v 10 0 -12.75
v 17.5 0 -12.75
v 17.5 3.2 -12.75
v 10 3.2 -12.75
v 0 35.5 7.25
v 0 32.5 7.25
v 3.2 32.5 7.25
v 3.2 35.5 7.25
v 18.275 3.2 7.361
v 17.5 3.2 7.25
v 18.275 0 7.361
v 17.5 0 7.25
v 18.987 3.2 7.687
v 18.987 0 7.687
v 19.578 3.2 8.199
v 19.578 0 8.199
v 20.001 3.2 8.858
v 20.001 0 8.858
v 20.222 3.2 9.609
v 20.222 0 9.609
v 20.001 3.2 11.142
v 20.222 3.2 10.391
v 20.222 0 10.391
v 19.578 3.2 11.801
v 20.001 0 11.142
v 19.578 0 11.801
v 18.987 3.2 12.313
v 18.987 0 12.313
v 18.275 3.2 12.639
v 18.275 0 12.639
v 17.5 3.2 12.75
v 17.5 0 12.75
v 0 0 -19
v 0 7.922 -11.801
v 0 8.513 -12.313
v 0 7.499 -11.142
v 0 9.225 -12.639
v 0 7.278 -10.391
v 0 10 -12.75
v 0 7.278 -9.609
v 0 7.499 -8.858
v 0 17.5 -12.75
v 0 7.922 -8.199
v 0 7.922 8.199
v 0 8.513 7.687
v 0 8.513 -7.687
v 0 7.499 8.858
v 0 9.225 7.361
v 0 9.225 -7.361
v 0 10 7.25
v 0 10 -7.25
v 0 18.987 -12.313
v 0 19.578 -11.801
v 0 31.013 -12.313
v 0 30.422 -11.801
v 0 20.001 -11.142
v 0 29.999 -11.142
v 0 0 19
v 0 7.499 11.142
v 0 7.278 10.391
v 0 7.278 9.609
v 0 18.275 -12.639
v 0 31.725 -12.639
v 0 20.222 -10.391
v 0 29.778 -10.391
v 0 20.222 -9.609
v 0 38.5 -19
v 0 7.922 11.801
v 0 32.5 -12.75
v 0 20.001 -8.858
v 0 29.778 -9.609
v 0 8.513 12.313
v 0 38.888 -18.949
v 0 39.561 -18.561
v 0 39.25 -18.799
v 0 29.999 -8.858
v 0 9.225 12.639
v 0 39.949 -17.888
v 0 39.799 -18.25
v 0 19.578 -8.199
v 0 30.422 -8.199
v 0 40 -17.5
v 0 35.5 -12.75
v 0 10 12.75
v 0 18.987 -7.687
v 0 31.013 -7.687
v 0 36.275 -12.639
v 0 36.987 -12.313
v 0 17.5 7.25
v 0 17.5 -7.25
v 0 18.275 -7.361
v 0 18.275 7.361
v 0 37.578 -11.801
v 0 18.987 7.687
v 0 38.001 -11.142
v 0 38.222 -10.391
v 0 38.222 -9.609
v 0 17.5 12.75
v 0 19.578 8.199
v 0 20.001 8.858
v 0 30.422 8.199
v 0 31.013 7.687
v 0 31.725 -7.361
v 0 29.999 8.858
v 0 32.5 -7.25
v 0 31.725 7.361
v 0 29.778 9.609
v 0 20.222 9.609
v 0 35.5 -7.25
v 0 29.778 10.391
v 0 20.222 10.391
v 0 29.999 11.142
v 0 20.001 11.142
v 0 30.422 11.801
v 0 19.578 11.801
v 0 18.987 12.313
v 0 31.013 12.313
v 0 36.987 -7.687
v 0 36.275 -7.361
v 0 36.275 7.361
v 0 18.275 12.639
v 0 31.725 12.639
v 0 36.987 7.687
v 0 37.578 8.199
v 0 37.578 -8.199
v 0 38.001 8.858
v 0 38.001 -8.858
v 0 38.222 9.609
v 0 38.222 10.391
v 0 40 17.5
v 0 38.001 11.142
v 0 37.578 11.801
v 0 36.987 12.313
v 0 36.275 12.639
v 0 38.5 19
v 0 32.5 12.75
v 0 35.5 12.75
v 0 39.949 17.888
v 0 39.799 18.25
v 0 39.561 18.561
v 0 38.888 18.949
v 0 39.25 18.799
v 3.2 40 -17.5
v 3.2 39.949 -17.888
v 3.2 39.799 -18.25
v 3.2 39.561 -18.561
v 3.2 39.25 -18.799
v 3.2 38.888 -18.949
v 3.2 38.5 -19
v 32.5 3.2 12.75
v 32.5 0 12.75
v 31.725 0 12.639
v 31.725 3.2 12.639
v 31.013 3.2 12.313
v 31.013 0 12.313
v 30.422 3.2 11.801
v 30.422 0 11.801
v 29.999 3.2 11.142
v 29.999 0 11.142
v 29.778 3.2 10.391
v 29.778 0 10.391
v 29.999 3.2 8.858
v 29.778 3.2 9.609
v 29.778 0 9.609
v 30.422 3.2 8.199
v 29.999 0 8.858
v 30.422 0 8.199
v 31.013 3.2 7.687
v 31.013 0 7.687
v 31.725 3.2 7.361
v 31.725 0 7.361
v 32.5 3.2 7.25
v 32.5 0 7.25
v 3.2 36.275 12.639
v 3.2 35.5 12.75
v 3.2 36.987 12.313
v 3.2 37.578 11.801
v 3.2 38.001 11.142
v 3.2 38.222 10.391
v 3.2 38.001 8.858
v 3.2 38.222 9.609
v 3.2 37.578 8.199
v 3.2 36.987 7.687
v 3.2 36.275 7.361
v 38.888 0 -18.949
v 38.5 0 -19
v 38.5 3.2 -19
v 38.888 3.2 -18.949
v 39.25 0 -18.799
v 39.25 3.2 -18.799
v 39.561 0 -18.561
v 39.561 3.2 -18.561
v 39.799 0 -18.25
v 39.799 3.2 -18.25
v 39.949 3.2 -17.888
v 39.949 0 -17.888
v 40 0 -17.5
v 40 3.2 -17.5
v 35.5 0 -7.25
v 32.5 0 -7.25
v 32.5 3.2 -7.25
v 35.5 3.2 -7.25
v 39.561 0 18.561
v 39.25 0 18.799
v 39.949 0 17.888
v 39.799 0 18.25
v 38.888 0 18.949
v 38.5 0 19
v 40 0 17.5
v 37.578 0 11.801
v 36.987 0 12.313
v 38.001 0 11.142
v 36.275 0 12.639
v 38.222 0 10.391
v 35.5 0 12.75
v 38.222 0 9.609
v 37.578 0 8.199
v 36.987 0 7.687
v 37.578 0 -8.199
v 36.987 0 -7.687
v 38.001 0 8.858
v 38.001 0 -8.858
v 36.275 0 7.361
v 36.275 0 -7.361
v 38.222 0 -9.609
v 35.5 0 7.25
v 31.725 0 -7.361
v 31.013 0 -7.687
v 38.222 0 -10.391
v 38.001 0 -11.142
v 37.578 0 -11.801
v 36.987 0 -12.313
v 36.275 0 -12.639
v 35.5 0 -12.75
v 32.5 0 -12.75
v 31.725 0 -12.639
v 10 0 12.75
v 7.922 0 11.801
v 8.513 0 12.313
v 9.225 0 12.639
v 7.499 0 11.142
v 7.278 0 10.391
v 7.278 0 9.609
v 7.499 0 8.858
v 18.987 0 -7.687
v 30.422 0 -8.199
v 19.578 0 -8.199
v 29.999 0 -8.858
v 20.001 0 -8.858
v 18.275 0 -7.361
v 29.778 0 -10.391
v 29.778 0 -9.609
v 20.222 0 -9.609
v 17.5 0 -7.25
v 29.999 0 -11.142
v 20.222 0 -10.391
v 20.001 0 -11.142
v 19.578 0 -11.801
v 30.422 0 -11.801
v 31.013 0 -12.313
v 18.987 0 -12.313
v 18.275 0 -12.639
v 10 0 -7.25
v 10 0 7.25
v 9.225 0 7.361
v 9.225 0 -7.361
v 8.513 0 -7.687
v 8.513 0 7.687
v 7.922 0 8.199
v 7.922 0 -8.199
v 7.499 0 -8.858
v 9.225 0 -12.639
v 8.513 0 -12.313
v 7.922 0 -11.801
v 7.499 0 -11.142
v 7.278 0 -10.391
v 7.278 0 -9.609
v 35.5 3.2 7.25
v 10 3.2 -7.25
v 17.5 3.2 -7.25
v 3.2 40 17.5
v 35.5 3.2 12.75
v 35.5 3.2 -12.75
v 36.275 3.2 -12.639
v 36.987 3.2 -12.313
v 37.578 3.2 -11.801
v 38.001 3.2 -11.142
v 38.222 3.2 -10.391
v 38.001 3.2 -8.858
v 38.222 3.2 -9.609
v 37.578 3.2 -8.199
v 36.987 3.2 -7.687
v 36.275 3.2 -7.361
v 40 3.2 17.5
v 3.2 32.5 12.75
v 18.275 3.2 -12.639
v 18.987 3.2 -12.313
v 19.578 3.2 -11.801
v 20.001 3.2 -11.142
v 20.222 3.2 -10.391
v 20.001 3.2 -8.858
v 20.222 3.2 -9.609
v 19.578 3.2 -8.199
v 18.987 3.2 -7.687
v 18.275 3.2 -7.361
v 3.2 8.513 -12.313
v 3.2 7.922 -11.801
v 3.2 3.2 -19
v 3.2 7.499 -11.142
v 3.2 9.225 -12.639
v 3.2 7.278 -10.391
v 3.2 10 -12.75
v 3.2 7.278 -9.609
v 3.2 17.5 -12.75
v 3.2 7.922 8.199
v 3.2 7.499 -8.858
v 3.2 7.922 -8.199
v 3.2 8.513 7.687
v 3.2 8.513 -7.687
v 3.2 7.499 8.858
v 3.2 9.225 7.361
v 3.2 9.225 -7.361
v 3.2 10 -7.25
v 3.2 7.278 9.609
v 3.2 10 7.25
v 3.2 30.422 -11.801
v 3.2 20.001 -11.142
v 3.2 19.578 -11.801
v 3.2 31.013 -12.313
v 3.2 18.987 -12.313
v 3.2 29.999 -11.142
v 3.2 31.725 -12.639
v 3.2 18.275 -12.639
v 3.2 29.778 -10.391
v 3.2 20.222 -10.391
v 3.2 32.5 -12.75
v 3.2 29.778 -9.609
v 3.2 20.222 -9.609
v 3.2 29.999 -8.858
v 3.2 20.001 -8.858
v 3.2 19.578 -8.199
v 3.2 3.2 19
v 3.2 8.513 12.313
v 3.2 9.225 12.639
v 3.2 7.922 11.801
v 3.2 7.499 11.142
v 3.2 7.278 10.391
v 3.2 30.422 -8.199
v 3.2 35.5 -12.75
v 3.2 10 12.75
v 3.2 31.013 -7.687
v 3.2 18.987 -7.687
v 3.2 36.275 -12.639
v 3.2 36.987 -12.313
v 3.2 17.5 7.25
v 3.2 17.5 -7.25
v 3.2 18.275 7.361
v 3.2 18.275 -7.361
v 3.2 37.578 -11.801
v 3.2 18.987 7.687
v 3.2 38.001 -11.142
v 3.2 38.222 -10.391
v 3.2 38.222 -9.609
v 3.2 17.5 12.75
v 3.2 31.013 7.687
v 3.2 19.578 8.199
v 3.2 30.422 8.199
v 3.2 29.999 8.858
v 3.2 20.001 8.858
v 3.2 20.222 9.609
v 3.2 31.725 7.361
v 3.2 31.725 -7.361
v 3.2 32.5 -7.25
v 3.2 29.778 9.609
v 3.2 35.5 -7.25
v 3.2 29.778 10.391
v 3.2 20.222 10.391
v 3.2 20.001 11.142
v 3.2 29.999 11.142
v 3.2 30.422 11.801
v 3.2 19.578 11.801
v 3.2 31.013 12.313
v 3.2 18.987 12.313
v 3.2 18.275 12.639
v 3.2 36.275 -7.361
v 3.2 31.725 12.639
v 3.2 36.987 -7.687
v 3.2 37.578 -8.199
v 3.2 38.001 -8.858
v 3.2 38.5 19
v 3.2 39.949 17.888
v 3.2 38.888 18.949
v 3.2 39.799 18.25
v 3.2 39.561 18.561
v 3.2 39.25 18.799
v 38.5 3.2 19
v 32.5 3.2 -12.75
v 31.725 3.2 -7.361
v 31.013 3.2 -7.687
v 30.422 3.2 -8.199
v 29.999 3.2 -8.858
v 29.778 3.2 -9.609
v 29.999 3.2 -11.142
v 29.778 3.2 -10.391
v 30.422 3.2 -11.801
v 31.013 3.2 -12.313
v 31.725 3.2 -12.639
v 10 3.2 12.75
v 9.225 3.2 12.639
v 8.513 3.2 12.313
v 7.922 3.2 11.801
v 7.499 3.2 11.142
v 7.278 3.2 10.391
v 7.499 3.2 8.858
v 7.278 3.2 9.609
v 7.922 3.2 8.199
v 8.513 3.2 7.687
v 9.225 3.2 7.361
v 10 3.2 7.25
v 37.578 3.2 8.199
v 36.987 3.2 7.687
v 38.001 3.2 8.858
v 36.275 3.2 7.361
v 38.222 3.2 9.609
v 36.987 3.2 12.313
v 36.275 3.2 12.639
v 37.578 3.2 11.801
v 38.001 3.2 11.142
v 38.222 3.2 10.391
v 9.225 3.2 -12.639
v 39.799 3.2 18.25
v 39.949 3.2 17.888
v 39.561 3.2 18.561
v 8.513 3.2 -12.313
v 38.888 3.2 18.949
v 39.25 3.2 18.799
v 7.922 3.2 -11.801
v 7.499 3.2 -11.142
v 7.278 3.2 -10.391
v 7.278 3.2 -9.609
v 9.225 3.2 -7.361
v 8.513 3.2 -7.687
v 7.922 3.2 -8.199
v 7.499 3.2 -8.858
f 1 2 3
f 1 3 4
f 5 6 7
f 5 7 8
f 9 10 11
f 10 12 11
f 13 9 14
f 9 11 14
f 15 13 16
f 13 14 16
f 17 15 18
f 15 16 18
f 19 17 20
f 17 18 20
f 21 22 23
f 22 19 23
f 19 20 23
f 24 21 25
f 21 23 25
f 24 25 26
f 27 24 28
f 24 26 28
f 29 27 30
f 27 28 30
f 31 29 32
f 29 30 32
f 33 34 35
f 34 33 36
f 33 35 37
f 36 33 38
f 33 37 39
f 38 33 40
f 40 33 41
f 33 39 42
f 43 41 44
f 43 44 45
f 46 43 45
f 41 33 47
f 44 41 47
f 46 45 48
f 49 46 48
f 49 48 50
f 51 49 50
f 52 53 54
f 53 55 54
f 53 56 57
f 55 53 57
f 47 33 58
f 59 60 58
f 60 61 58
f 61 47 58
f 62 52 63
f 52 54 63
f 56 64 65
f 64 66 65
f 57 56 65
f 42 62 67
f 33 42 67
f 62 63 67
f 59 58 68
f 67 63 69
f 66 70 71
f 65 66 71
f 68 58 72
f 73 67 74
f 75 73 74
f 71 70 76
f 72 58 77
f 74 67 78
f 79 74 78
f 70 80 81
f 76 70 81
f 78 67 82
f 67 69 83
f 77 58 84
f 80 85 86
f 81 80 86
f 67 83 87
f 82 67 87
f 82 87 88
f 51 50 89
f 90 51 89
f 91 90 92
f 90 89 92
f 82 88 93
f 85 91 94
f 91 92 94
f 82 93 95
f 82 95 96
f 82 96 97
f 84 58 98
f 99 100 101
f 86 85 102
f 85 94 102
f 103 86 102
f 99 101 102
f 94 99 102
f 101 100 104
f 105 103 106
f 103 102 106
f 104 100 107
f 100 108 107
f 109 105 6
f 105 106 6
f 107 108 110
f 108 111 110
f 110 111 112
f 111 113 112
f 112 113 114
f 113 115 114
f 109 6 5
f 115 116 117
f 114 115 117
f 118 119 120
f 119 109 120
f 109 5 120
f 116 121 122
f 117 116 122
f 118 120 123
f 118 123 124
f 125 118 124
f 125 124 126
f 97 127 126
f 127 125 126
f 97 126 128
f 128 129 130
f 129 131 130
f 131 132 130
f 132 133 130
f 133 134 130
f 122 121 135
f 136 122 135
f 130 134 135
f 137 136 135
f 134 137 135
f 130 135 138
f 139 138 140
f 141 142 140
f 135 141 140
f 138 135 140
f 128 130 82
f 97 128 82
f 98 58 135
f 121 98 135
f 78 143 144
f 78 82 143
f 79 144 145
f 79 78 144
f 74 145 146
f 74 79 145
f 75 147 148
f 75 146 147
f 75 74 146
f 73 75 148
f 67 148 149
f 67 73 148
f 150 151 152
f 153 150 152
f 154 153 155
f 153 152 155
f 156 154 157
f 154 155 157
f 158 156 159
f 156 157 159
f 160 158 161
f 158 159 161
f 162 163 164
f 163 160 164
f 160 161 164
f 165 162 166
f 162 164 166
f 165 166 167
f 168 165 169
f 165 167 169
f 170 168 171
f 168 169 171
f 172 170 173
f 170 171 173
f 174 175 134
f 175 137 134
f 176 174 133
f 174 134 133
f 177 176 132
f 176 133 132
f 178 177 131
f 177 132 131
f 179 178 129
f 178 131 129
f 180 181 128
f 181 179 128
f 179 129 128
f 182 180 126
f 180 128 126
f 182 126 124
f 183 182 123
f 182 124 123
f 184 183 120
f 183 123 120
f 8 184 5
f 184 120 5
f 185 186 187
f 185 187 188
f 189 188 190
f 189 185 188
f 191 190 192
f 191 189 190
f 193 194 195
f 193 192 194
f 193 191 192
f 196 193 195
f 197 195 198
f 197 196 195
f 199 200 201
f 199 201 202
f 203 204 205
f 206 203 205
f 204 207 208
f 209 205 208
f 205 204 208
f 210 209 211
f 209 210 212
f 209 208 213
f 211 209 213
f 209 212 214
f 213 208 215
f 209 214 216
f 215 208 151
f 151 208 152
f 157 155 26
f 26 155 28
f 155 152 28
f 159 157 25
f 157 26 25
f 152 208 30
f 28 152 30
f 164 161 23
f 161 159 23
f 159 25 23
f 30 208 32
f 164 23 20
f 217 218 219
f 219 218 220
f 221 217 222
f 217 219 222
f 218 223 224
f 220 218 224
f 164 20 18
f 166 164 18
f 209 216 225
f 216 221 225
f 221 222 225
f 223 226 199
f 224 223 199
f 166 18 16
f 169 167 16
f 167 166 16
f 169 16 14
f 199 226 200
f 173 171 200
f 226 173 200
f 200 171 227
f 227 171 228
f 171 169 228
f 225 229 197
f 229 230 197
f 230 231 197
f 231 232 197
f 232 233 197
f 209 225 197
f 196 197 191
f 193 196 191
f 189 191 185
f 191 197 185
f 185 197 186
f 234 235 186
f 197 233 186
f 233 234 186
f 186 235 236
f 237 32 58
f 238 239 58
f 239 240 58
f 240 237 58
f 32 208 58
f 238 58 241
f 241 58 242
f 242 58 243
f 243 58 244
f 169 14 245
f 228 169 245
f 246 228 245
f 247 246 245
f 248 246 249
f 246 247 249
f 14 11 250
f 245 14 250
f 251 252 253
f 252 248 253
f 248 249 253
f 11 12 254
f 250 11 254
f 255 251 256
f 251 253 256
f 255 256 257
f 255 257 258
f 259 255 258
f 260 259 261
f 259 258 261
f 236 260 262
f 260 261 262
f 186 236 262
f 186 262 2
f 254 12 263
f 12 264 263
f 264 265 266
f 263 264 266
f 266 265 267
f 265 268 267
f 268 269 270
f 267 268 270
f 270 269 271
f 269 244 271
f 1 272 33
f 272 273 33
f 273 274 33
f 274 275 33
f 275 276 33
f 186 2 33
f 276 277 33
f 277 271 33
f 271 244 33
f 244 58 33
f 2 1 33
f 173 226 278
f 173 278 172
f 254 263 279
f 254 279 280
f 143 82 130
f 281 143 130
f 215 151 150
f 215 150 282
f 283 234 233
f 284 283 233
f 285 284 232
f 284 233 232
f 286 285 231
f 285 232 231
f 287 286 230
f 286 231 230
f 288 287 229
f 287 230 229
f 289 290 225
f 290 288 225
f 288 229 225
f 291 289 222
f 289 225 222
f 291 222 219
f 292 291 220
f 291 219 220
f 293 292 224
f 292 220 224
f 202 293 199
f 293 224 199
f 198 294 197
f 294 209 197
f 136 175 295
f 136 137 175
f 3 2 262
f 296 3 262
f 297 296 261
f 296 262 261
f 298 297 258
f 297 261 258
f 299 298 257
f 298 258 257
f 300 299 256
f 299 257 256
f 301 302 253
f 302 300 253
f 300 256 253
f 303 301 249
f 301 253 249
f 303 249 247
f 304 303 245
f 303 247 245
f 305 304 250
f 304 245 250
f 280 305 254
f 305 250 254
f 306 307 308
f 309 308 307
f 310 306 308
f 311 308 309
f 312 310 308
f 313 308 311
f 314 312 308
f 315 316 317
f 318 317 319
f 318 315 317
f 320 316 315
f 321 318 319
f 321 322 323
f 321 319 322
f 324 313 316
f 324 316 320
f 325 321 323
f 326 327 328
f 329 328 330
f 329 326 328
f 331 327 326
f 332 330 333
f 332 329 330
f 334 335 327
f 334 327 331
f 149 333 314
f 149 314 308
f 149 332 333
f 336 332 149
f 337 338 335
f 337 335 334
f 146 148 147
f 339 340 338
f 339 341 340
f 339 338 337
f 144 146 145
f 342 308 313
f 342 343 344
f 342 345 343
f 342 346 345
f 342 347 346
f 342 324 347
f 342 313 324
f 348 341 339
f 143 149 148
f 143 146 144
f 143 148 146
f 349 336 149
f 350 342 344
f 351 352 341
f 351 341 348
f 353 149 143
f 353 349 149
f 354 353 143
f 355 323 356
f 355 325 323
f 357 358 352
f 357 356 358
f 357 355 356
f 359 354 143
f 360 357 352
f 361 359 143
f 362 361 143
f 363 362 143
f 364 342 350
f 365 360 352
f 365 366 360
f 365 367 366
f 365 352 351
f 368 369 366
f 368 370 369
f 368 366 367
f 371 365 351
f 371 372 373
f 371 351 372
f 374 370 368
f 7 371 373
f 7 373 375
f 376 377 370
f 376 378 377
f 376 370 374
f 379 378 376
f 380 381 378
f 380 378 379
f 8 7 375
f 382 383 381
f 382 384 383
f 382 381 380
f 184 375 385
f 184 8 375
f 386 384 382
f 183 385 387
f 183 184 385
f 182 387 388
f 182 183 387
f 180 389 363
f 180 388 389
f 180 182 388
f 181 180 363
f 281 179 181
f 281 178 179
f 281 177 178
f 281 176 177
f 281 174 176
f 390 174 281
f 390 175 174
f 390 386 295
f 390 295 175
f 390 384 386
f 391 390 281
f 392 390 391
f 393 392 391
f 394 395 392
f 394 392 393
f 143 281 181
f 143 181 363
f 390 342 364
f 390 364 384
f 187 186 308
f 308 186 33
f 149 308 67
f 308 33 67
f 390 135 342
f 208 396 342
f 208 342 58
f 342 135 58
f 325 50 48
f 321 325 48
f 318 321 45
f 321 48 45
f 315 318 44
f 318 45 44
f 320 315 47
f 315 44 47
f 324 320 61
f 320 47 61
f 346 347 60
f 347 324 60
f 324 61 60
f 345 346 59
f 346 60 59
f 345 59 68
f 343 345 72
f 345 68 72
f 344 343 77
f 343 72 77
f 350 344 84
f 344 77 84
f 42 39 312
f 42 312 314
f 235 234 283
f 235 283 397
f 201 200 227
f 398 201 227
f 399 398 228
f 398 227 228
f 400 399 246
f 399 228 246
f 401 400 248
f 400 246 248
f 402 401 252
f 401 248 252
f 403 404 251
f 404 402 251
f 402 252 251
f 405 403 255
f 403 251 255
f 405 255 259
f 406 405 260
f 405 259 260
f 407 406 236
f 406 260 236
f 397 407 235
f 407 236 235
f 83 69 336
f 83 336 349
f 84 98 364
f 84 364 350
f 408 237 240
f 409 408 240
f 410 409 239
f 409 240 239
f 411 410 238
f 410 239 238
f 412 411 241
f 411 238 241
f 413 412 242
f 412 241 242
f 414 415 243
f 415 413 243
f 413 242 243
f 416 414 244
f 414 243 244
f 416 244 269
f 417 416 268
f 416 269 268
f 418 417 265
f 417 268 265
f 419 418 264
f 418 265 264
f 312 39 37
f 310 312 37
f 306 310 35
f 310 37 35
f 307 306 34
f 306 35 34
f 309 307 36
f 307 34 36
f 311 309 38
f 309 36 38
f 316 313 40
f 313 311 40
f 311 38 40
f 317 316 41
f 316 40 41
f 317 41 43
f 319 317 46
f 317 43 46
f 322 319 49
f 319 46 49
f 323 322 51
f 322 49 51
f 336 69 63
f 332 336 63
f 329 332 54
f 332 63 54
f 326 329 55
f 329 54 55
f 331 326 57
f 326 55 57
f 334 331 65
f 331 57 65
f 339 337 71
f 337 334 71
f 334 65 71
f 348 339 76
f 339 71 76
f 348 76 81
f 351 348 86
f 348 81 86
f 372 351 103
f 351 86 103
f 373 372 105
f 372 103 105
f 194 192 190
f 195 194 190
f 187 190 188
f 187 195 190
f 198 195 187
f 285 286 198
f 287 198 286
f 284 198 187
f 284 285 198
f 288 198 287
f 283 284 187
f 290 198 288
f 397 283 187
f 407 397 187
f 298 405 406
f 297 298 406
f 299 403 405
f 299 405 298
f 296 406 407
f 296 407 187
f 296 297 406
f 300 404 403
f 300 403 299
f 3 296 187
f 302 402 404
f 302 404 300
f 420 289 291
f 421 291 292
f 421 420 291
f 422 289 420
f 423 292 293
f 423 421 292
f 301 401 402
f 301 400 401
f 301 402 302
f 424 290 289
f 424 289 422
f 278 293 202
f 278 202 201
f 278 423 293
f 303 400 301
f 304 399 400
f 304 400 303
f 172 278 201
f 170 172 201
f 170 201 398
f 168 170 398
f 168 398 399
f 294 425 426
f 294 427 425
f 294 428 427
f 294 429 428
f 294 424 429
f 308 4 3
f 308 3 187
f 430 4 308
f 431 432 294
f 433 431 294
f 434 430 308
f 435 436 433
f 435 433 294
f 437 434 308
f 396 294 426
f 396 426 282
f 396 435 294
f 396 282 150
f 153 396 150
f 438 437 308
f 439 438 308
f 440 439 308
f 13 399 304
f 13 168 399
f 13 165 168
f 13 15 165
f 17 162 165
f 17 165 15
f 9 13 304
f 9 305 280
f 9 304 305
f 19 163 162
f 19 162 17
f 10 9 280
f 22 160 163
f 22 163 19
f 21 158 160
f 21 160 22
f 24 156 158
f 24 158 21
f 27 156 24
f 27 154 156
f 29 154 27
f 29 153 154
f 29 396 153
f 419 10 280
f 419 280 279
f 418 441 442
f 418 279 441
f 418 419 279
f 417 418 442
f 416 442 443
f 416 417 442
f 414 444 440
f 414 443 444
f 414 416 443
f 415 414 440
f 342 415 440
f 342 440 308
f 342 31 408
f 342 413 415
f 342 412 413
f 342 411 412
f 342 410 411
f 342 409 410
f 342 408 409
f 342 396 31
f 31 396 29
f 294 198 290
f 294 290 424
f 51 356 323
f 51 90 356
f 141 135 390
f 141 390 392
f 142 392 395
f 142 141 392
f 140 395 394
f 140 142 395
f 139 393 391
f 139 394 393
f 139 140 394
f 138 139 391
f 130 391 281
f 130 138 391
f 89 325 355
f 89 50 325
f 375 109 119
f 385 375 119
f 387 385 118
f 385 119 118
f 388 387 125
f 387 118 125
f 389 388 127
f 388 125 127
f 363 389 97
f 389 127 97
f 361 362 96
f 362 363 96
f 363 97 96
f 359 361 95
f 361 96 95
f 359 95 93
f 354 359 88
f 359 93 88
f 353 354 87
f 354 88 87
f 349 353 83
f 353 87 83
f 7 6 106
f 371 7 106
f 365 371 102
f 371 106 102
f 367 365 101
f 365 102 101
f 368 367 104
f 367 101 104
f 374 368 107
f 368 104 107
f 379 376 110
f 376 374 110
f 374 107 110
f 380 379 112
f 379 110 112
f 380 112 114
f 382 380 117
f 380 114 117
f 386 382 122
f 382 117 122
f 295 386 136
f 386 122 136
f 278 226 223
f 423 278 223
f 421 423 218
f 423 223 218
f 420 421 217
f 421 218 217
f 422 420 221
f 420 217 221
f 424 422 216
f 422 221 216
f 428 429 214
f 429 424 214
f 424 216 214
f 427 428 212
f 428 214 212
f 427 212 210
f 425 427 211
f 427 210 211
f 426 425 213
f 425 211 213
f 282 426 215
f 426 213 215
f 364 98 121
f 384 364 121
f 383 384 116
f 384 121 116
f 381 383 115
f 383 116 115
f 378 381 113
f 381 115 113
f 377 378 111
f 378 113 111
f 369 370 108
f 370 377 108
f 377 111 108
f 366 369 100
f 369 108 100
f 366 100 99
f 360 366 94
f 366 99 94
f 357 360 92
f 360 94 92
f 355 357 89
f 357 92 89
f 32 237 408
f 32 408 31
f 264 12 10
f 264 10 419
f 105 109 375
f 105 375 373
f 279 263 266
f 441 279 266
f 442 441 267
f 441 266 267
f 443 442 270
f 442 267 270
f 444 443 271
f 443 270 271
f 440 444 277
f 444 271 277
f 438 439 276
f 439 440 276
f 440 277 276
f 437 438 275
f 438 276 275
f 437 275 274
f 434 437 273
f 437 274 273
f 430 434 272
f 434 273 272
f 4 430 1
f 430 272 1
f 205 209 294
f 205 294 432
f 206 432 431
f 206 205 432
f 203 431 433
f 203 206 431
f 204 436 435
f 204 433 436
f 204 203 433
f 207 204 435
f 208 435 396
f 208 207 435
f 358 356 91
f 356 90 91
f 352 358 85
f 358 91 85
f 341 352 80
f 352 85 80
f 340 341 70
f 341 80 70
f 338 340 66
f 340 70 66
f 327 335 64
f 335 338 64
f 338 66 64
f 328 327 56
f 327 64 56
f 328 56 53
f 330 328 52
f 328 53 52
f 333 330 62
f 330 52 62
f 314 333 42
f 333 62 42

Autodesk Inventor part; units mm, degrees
sketch "Sketch_1" plane through (0, 0, 0) normal (1, 0, 0) x (0, 1, 0)
  line L0 (38.5, 19) -> (0, 19)
  line L1 (0, 19) -> (0, -19)
  line L2 (0, -19) -> (38.5, -19)
  arc A0 (38.5, -19) -> (40, -17.5) centre (38.5, -17.5) ccw
  line L3 (40, -17.5) -> (40, 17.5)
  arc A1 (40, 17.5) -> (38.5, 19) centre (38.5, 17.5) ccw
  line L4 (17.5, -7.25) -> (10, -7.25)
  arc A2 (10, -7.25) -> (10, -12.75) centre (10, -10) ccw
  line L5 (10, -12.75) -> (17.5, -12.75)
  arc A3 (17.5, -12.75) -> (17.5, -7.25) centre (17.5, -10) ccw
  line L6 (35.5, -7.25) -> (32.5, -7.25)
  arc A4 (32.5, -7.25) -> (32.5, -12.75) centre (32.5, -10) ccw
  line L7 (32.5, -12.75) -> (35.5, -12.75)
  arc A5 (35.5, -12.75) -> (35.5, -7.25) centre (35.5, -10) ccw
  line L8 (17.5, 12.75) -> (10, 12.75)
  arc A6 (10, 12.75) -> (10, 7.25) centre (10, 10) ccw
  line L9 (10, 7.25) -> (17.5, 7.25)
  arc A7 (17.5, 7.25) -> (17.5, 12.75) centre (17.5, 10) ccw
  line L10 (35.5, 12.75) -> (32.5, 12.75)
  arc A8 (32.5, 12.75) -> (32.5, 7.25) centre (32.5, 10) ccw
  line L11 (32.5, 7.25) -> (35.5, 7.25)
  arc A9 (35.5, 7.25) -> (35.5, 12.75) centre (35.5, 10) ccw
extrude "Extrusion1" add sketch "Sketch_1" along normal blind 3.2
sketch "Sketch_3" plane through (0, 0, 0) normal (0, 1, 0) x (-1, 0, 0)
  line L0 (0, 19) -> (-38.5, 19)
  arc A0 (-38.5, 19) -> (-40, 17.5) centre (-38.5, 17.5) ccw
  line L1 (-40, 17.5) -> (-40, -17.5)
  arc A1 (-40, -17.5) -> (-38.5, -19) centre (-38.5, -17.5) ccw
  line L2 (-38.5, -19) -> (0, -19)
  line L3 (0, -19) -> (0, 19)
  arc A2 (-32.5, -12.75) -> (-32.5, -7.25) centre (-32.5, -10) ccw
  line L4 (-32.5, -7.25) -> (-35.5, -7.25)
  arc A3 (-35.5, -7.25) -> (-35.5, -12.75) centre (-35.5, -10) ccw
  line L5 (-35.5, -12.75) -> (-32.5, -12.75)
  arc A4 (-32.5, 7.25) -> (-32.5, 12.75) centre (-32.5, 10) ccw
  line L6 (-32.5, 12.75) -> (-35.5, 12.75)
  arc A5 (-35.5, 12.75) -> (-35.5, 7.25) centre (-35.5, 10) ccw
  line L7 (-35.5, 7.25) -> (-32.5, 7.25)
  arc A6 (-10, -12.75) -> (-10, -7.25) centre (-10, -10) ccw
  line L8 (-10, -7.25) -> (-17.5, -7.25)
  arc A7 (-17.5, -7.25) -> (-17.5, -12.75) centre (-17.5, -10) ccw
  line L9 (-17.5, -12.75) -> (-10, -12.75)
  arc A8 (-10, 7.25) -> (-10, 12.75) centre (-10, 10) ccw
  line L10 (-10, 12.75) -> (-17.5, 12.75)
  arc A9 (-17.5, 12.75) -> (-17.5, 7.25) centre (-17.5, 10) ccw
  line L11 (-17.5, 7.25) -> (-10, 7.25)
extrude "Extrusion2" add sketch "Sketch_3" along normal blind 3.2
ref_plane "to_cbm_1_1_XY" through (3.2, 17.5, -10) normal (1, 0, 0) x (0, 0, -1)
ref_plane "to_cbm_1_1_YZ" through (3.2, 17.5, -10) normal (0, 0, -1) x (0, 1, 0)
ref_plane "to_cbm_1_1_ZX" through (3.2, 17.5, -10) normal (0, 1, 0) x (1, 0, 0)
ref_plane "to_cbm_1_2_XY" through (3.2, 17.5, 10) normal (1, 0, 0) x (0, 0, -1)
ref_plane "to_cbm_1_2_YZ" through (3.2, 17.5, 10) normal (0, 0, -1) x (0, 1, 0)
ref_plane "to_cbm_1_2_ZX" through (3.2, 17.5, 10) normal (0, 1, 0) x (1, 0, 0)
ref_plane "to_cbm_1_3_XY" through (3.2, 35.5, -10) normal (1, 0, 0) x (0, 0, -1)
ref_plane "to_cbm_1_3_YZ" through (3.2, 35.5, -10) normal (0, 0, -1) x (0, 1, 0)
ref_plane "to_cbm_1_3_ZX" through (3.2, 35.5, -10) normal (0, 1, 0) x (1, 0, 0)
ref_plane "to_cbm_1_4_XY" through (3.2, 35.5, 10) normal (1, 0, 0) x (0, 0, -1)
ref_plane "to_cbm_1_4_YZ" through (3.2, 35.5, 10) normal (0, 0, -1) x (0, 1, 0)
ref_plane "to_cbm_1_4_ZX" through (3.2, 35.5, 10) normal (0, 1, 0) x (1, 0, 0)
ref_plane "to_cbm_2_1_XY" through (17.5, 3.2, 10) normal (0, 1, 0) x (1, 0, 0)
ref_plane "to_cbm_2_1_YZ" through (17.5, 3.2, 10) normal (1, 0, 0) x (0, 0, -1)
ref_plane "to_cbm_2_1_ZX" through (17.5, 3.2, 10) normal (0, 0, -1) x (0, 1, 0)
ref_plane "to_cbm_2_2_XY" through (17.5, 3.2, -10) normal (0, 1, 0) x (1, 0, 0)
ref_plane "to_cbm_2_2_YZ" through (17.5, 3.2, -10) normal (1, 0, 0) x (0, 0, -1)
ref_plane "to_cbm_2_2_ZX" through (17.5, 3.2, -10) normal (0, 0, -1) x (0, 1, 0)
ref_plane "to_cbm_2_3_XY" through (35.5, 3.2, 10) normal (0, 1, 0) x (1, 0, 0)
ref_plane "to_cbm_2_3_YZ" through (35.5, 3.2, 10) normal (1, 0, 0) x (0, 0, -1)
ref_plane "to_cbm_2_3_ZX" through (35.5, 3.2, 10) normal (0, 0, -1) x (0, 1, 0)
ref_plane "to_cbm_2_4_XY" through (35.5, 3.2, -10) normal (0, 1, 0) x (1, 0, 0)
ref_plane "to_cbm_2_4_YZ" through (35.5, 3.2, -10) normal (1, 0, 0) x (0, 0, -1)
ref_plane "to_cbm_2_4_ZX" through (35.5, 3.2, -10) normal (0, 0, -1) x (0, 1, 0)
ref_plane "to_hntp5_1_1_XY" through (-2, 17.5, -10) normal (-1, 0, 0) x (0, -1, 0)
ref_plane "to_hntp5_1_1_YZ" through (-2, 17.5, -10) normal (0, -1, 0) x (0, 0, 1)
ref_plane "to_hntp5_1_1_ZX" through (-2, 17.5, -10) normal (0, 0, 1) x (-1, 0, 0)
ref_plane "to_hntp5_1_2_XY" through (-2, 17.5, 10) normal (-1, 0, 0) x (0, -1, 0)
ref_plane "to_hntp5_1_2_YZ" through (-2, 17.5, 10) normal (0, -1, 0) x (0, 0, 1)
ref_plane "to_hntp5_1_2_ZX" through (-2, 17.5, 10) normal (0, 0, 1) x (-1, 0, 0)
ref_plane "to_hntp5_1_3_XY" through (-2, 35.5, -10) normal (-1, 0, 0) x (0, -1, 0)
ref_plane "to_hntp5_1_3_YZ" through (-2, 35.5, -10) normal (0, -1, 0) x (0, 0, 1)
ref_plane "to_hntp5_1_3_ZX" through (-2, 35.5, -10) normal (0, 0, 1) x (-1, 0, 0)
ref_plane "to_hntp5_1_4_XY" through (-2, 35.5, 10) normal (-1, 0, 0) x (0, -1, 0)
ref_plane "to_hntp5_1_4_YZ" through (-2, 35.5, 10) normal (0, -1, 0) x (0, 0, 1)
ref_plane "to_hntp5_1_4_ZX" through (-2, 35.5, 10) normal (0, 0, 1) x (-1, 0, 0)
ref_plane "to_hntp5_2_1_XY" through (17.5, -2, 10) normal (0, -1, 0) x (-1, 0, 0)
ref_plane "to_hntp5_2_1_YZ" through (17.5, -2, 10) normal (-1, 0, 0) x (0, 0, -1)
ref_plane "to_hntp5_2_1_ZX" through (17.5, -2, 10) normal (0, 0, -1) x (0, -1, 0)
ref_plane "to_hntp5_2_2_XY" through (17.5, -2, -10) normal (0, -1, 0) x (-1, 0, 0)
ref_plane "to_hntp5_2_2_YZ" through (17.5, -2, -10) normal (-1, 0, 0) x (0, 0, -1)
ref_plane "to_hntp5_2_2_ZX" through (17.5, -2, -10) normal (0, 0, -1) x (0, -1, 0)
ref_plane "to_hntp5_2_3_XY" through (35.5, -2, 10) normal (0, -1, 0) x (-1, 0, 0)
ref_plane "to_hntp5_2_3_YZ" through (35.5, -2, 10) normal (-1, 0, 0) x (0, 0, -1)
ref_plane "to_hntp5_2_3_ZX" through (35.5, -2, 10) normal (0, 0, -1) x (0, -1, 0)
ref_plane "to_hntp5_2_4_XY" through (35.5, -2, -10) normal (0, -1, 0) x (-1, 0, 0)
ref_plane "to_hntp5_2_4_YZ" through (35.5, -2, -10) normal (-1, 0, 0) x (0, 0, -1)
ref_plane "to_hntp5_2_4_ZX" through (35.5, -2, -10) normal (0, 0, -1) x (0, -1, 0)
properties part number "HPTBDW5-SEP_b."
